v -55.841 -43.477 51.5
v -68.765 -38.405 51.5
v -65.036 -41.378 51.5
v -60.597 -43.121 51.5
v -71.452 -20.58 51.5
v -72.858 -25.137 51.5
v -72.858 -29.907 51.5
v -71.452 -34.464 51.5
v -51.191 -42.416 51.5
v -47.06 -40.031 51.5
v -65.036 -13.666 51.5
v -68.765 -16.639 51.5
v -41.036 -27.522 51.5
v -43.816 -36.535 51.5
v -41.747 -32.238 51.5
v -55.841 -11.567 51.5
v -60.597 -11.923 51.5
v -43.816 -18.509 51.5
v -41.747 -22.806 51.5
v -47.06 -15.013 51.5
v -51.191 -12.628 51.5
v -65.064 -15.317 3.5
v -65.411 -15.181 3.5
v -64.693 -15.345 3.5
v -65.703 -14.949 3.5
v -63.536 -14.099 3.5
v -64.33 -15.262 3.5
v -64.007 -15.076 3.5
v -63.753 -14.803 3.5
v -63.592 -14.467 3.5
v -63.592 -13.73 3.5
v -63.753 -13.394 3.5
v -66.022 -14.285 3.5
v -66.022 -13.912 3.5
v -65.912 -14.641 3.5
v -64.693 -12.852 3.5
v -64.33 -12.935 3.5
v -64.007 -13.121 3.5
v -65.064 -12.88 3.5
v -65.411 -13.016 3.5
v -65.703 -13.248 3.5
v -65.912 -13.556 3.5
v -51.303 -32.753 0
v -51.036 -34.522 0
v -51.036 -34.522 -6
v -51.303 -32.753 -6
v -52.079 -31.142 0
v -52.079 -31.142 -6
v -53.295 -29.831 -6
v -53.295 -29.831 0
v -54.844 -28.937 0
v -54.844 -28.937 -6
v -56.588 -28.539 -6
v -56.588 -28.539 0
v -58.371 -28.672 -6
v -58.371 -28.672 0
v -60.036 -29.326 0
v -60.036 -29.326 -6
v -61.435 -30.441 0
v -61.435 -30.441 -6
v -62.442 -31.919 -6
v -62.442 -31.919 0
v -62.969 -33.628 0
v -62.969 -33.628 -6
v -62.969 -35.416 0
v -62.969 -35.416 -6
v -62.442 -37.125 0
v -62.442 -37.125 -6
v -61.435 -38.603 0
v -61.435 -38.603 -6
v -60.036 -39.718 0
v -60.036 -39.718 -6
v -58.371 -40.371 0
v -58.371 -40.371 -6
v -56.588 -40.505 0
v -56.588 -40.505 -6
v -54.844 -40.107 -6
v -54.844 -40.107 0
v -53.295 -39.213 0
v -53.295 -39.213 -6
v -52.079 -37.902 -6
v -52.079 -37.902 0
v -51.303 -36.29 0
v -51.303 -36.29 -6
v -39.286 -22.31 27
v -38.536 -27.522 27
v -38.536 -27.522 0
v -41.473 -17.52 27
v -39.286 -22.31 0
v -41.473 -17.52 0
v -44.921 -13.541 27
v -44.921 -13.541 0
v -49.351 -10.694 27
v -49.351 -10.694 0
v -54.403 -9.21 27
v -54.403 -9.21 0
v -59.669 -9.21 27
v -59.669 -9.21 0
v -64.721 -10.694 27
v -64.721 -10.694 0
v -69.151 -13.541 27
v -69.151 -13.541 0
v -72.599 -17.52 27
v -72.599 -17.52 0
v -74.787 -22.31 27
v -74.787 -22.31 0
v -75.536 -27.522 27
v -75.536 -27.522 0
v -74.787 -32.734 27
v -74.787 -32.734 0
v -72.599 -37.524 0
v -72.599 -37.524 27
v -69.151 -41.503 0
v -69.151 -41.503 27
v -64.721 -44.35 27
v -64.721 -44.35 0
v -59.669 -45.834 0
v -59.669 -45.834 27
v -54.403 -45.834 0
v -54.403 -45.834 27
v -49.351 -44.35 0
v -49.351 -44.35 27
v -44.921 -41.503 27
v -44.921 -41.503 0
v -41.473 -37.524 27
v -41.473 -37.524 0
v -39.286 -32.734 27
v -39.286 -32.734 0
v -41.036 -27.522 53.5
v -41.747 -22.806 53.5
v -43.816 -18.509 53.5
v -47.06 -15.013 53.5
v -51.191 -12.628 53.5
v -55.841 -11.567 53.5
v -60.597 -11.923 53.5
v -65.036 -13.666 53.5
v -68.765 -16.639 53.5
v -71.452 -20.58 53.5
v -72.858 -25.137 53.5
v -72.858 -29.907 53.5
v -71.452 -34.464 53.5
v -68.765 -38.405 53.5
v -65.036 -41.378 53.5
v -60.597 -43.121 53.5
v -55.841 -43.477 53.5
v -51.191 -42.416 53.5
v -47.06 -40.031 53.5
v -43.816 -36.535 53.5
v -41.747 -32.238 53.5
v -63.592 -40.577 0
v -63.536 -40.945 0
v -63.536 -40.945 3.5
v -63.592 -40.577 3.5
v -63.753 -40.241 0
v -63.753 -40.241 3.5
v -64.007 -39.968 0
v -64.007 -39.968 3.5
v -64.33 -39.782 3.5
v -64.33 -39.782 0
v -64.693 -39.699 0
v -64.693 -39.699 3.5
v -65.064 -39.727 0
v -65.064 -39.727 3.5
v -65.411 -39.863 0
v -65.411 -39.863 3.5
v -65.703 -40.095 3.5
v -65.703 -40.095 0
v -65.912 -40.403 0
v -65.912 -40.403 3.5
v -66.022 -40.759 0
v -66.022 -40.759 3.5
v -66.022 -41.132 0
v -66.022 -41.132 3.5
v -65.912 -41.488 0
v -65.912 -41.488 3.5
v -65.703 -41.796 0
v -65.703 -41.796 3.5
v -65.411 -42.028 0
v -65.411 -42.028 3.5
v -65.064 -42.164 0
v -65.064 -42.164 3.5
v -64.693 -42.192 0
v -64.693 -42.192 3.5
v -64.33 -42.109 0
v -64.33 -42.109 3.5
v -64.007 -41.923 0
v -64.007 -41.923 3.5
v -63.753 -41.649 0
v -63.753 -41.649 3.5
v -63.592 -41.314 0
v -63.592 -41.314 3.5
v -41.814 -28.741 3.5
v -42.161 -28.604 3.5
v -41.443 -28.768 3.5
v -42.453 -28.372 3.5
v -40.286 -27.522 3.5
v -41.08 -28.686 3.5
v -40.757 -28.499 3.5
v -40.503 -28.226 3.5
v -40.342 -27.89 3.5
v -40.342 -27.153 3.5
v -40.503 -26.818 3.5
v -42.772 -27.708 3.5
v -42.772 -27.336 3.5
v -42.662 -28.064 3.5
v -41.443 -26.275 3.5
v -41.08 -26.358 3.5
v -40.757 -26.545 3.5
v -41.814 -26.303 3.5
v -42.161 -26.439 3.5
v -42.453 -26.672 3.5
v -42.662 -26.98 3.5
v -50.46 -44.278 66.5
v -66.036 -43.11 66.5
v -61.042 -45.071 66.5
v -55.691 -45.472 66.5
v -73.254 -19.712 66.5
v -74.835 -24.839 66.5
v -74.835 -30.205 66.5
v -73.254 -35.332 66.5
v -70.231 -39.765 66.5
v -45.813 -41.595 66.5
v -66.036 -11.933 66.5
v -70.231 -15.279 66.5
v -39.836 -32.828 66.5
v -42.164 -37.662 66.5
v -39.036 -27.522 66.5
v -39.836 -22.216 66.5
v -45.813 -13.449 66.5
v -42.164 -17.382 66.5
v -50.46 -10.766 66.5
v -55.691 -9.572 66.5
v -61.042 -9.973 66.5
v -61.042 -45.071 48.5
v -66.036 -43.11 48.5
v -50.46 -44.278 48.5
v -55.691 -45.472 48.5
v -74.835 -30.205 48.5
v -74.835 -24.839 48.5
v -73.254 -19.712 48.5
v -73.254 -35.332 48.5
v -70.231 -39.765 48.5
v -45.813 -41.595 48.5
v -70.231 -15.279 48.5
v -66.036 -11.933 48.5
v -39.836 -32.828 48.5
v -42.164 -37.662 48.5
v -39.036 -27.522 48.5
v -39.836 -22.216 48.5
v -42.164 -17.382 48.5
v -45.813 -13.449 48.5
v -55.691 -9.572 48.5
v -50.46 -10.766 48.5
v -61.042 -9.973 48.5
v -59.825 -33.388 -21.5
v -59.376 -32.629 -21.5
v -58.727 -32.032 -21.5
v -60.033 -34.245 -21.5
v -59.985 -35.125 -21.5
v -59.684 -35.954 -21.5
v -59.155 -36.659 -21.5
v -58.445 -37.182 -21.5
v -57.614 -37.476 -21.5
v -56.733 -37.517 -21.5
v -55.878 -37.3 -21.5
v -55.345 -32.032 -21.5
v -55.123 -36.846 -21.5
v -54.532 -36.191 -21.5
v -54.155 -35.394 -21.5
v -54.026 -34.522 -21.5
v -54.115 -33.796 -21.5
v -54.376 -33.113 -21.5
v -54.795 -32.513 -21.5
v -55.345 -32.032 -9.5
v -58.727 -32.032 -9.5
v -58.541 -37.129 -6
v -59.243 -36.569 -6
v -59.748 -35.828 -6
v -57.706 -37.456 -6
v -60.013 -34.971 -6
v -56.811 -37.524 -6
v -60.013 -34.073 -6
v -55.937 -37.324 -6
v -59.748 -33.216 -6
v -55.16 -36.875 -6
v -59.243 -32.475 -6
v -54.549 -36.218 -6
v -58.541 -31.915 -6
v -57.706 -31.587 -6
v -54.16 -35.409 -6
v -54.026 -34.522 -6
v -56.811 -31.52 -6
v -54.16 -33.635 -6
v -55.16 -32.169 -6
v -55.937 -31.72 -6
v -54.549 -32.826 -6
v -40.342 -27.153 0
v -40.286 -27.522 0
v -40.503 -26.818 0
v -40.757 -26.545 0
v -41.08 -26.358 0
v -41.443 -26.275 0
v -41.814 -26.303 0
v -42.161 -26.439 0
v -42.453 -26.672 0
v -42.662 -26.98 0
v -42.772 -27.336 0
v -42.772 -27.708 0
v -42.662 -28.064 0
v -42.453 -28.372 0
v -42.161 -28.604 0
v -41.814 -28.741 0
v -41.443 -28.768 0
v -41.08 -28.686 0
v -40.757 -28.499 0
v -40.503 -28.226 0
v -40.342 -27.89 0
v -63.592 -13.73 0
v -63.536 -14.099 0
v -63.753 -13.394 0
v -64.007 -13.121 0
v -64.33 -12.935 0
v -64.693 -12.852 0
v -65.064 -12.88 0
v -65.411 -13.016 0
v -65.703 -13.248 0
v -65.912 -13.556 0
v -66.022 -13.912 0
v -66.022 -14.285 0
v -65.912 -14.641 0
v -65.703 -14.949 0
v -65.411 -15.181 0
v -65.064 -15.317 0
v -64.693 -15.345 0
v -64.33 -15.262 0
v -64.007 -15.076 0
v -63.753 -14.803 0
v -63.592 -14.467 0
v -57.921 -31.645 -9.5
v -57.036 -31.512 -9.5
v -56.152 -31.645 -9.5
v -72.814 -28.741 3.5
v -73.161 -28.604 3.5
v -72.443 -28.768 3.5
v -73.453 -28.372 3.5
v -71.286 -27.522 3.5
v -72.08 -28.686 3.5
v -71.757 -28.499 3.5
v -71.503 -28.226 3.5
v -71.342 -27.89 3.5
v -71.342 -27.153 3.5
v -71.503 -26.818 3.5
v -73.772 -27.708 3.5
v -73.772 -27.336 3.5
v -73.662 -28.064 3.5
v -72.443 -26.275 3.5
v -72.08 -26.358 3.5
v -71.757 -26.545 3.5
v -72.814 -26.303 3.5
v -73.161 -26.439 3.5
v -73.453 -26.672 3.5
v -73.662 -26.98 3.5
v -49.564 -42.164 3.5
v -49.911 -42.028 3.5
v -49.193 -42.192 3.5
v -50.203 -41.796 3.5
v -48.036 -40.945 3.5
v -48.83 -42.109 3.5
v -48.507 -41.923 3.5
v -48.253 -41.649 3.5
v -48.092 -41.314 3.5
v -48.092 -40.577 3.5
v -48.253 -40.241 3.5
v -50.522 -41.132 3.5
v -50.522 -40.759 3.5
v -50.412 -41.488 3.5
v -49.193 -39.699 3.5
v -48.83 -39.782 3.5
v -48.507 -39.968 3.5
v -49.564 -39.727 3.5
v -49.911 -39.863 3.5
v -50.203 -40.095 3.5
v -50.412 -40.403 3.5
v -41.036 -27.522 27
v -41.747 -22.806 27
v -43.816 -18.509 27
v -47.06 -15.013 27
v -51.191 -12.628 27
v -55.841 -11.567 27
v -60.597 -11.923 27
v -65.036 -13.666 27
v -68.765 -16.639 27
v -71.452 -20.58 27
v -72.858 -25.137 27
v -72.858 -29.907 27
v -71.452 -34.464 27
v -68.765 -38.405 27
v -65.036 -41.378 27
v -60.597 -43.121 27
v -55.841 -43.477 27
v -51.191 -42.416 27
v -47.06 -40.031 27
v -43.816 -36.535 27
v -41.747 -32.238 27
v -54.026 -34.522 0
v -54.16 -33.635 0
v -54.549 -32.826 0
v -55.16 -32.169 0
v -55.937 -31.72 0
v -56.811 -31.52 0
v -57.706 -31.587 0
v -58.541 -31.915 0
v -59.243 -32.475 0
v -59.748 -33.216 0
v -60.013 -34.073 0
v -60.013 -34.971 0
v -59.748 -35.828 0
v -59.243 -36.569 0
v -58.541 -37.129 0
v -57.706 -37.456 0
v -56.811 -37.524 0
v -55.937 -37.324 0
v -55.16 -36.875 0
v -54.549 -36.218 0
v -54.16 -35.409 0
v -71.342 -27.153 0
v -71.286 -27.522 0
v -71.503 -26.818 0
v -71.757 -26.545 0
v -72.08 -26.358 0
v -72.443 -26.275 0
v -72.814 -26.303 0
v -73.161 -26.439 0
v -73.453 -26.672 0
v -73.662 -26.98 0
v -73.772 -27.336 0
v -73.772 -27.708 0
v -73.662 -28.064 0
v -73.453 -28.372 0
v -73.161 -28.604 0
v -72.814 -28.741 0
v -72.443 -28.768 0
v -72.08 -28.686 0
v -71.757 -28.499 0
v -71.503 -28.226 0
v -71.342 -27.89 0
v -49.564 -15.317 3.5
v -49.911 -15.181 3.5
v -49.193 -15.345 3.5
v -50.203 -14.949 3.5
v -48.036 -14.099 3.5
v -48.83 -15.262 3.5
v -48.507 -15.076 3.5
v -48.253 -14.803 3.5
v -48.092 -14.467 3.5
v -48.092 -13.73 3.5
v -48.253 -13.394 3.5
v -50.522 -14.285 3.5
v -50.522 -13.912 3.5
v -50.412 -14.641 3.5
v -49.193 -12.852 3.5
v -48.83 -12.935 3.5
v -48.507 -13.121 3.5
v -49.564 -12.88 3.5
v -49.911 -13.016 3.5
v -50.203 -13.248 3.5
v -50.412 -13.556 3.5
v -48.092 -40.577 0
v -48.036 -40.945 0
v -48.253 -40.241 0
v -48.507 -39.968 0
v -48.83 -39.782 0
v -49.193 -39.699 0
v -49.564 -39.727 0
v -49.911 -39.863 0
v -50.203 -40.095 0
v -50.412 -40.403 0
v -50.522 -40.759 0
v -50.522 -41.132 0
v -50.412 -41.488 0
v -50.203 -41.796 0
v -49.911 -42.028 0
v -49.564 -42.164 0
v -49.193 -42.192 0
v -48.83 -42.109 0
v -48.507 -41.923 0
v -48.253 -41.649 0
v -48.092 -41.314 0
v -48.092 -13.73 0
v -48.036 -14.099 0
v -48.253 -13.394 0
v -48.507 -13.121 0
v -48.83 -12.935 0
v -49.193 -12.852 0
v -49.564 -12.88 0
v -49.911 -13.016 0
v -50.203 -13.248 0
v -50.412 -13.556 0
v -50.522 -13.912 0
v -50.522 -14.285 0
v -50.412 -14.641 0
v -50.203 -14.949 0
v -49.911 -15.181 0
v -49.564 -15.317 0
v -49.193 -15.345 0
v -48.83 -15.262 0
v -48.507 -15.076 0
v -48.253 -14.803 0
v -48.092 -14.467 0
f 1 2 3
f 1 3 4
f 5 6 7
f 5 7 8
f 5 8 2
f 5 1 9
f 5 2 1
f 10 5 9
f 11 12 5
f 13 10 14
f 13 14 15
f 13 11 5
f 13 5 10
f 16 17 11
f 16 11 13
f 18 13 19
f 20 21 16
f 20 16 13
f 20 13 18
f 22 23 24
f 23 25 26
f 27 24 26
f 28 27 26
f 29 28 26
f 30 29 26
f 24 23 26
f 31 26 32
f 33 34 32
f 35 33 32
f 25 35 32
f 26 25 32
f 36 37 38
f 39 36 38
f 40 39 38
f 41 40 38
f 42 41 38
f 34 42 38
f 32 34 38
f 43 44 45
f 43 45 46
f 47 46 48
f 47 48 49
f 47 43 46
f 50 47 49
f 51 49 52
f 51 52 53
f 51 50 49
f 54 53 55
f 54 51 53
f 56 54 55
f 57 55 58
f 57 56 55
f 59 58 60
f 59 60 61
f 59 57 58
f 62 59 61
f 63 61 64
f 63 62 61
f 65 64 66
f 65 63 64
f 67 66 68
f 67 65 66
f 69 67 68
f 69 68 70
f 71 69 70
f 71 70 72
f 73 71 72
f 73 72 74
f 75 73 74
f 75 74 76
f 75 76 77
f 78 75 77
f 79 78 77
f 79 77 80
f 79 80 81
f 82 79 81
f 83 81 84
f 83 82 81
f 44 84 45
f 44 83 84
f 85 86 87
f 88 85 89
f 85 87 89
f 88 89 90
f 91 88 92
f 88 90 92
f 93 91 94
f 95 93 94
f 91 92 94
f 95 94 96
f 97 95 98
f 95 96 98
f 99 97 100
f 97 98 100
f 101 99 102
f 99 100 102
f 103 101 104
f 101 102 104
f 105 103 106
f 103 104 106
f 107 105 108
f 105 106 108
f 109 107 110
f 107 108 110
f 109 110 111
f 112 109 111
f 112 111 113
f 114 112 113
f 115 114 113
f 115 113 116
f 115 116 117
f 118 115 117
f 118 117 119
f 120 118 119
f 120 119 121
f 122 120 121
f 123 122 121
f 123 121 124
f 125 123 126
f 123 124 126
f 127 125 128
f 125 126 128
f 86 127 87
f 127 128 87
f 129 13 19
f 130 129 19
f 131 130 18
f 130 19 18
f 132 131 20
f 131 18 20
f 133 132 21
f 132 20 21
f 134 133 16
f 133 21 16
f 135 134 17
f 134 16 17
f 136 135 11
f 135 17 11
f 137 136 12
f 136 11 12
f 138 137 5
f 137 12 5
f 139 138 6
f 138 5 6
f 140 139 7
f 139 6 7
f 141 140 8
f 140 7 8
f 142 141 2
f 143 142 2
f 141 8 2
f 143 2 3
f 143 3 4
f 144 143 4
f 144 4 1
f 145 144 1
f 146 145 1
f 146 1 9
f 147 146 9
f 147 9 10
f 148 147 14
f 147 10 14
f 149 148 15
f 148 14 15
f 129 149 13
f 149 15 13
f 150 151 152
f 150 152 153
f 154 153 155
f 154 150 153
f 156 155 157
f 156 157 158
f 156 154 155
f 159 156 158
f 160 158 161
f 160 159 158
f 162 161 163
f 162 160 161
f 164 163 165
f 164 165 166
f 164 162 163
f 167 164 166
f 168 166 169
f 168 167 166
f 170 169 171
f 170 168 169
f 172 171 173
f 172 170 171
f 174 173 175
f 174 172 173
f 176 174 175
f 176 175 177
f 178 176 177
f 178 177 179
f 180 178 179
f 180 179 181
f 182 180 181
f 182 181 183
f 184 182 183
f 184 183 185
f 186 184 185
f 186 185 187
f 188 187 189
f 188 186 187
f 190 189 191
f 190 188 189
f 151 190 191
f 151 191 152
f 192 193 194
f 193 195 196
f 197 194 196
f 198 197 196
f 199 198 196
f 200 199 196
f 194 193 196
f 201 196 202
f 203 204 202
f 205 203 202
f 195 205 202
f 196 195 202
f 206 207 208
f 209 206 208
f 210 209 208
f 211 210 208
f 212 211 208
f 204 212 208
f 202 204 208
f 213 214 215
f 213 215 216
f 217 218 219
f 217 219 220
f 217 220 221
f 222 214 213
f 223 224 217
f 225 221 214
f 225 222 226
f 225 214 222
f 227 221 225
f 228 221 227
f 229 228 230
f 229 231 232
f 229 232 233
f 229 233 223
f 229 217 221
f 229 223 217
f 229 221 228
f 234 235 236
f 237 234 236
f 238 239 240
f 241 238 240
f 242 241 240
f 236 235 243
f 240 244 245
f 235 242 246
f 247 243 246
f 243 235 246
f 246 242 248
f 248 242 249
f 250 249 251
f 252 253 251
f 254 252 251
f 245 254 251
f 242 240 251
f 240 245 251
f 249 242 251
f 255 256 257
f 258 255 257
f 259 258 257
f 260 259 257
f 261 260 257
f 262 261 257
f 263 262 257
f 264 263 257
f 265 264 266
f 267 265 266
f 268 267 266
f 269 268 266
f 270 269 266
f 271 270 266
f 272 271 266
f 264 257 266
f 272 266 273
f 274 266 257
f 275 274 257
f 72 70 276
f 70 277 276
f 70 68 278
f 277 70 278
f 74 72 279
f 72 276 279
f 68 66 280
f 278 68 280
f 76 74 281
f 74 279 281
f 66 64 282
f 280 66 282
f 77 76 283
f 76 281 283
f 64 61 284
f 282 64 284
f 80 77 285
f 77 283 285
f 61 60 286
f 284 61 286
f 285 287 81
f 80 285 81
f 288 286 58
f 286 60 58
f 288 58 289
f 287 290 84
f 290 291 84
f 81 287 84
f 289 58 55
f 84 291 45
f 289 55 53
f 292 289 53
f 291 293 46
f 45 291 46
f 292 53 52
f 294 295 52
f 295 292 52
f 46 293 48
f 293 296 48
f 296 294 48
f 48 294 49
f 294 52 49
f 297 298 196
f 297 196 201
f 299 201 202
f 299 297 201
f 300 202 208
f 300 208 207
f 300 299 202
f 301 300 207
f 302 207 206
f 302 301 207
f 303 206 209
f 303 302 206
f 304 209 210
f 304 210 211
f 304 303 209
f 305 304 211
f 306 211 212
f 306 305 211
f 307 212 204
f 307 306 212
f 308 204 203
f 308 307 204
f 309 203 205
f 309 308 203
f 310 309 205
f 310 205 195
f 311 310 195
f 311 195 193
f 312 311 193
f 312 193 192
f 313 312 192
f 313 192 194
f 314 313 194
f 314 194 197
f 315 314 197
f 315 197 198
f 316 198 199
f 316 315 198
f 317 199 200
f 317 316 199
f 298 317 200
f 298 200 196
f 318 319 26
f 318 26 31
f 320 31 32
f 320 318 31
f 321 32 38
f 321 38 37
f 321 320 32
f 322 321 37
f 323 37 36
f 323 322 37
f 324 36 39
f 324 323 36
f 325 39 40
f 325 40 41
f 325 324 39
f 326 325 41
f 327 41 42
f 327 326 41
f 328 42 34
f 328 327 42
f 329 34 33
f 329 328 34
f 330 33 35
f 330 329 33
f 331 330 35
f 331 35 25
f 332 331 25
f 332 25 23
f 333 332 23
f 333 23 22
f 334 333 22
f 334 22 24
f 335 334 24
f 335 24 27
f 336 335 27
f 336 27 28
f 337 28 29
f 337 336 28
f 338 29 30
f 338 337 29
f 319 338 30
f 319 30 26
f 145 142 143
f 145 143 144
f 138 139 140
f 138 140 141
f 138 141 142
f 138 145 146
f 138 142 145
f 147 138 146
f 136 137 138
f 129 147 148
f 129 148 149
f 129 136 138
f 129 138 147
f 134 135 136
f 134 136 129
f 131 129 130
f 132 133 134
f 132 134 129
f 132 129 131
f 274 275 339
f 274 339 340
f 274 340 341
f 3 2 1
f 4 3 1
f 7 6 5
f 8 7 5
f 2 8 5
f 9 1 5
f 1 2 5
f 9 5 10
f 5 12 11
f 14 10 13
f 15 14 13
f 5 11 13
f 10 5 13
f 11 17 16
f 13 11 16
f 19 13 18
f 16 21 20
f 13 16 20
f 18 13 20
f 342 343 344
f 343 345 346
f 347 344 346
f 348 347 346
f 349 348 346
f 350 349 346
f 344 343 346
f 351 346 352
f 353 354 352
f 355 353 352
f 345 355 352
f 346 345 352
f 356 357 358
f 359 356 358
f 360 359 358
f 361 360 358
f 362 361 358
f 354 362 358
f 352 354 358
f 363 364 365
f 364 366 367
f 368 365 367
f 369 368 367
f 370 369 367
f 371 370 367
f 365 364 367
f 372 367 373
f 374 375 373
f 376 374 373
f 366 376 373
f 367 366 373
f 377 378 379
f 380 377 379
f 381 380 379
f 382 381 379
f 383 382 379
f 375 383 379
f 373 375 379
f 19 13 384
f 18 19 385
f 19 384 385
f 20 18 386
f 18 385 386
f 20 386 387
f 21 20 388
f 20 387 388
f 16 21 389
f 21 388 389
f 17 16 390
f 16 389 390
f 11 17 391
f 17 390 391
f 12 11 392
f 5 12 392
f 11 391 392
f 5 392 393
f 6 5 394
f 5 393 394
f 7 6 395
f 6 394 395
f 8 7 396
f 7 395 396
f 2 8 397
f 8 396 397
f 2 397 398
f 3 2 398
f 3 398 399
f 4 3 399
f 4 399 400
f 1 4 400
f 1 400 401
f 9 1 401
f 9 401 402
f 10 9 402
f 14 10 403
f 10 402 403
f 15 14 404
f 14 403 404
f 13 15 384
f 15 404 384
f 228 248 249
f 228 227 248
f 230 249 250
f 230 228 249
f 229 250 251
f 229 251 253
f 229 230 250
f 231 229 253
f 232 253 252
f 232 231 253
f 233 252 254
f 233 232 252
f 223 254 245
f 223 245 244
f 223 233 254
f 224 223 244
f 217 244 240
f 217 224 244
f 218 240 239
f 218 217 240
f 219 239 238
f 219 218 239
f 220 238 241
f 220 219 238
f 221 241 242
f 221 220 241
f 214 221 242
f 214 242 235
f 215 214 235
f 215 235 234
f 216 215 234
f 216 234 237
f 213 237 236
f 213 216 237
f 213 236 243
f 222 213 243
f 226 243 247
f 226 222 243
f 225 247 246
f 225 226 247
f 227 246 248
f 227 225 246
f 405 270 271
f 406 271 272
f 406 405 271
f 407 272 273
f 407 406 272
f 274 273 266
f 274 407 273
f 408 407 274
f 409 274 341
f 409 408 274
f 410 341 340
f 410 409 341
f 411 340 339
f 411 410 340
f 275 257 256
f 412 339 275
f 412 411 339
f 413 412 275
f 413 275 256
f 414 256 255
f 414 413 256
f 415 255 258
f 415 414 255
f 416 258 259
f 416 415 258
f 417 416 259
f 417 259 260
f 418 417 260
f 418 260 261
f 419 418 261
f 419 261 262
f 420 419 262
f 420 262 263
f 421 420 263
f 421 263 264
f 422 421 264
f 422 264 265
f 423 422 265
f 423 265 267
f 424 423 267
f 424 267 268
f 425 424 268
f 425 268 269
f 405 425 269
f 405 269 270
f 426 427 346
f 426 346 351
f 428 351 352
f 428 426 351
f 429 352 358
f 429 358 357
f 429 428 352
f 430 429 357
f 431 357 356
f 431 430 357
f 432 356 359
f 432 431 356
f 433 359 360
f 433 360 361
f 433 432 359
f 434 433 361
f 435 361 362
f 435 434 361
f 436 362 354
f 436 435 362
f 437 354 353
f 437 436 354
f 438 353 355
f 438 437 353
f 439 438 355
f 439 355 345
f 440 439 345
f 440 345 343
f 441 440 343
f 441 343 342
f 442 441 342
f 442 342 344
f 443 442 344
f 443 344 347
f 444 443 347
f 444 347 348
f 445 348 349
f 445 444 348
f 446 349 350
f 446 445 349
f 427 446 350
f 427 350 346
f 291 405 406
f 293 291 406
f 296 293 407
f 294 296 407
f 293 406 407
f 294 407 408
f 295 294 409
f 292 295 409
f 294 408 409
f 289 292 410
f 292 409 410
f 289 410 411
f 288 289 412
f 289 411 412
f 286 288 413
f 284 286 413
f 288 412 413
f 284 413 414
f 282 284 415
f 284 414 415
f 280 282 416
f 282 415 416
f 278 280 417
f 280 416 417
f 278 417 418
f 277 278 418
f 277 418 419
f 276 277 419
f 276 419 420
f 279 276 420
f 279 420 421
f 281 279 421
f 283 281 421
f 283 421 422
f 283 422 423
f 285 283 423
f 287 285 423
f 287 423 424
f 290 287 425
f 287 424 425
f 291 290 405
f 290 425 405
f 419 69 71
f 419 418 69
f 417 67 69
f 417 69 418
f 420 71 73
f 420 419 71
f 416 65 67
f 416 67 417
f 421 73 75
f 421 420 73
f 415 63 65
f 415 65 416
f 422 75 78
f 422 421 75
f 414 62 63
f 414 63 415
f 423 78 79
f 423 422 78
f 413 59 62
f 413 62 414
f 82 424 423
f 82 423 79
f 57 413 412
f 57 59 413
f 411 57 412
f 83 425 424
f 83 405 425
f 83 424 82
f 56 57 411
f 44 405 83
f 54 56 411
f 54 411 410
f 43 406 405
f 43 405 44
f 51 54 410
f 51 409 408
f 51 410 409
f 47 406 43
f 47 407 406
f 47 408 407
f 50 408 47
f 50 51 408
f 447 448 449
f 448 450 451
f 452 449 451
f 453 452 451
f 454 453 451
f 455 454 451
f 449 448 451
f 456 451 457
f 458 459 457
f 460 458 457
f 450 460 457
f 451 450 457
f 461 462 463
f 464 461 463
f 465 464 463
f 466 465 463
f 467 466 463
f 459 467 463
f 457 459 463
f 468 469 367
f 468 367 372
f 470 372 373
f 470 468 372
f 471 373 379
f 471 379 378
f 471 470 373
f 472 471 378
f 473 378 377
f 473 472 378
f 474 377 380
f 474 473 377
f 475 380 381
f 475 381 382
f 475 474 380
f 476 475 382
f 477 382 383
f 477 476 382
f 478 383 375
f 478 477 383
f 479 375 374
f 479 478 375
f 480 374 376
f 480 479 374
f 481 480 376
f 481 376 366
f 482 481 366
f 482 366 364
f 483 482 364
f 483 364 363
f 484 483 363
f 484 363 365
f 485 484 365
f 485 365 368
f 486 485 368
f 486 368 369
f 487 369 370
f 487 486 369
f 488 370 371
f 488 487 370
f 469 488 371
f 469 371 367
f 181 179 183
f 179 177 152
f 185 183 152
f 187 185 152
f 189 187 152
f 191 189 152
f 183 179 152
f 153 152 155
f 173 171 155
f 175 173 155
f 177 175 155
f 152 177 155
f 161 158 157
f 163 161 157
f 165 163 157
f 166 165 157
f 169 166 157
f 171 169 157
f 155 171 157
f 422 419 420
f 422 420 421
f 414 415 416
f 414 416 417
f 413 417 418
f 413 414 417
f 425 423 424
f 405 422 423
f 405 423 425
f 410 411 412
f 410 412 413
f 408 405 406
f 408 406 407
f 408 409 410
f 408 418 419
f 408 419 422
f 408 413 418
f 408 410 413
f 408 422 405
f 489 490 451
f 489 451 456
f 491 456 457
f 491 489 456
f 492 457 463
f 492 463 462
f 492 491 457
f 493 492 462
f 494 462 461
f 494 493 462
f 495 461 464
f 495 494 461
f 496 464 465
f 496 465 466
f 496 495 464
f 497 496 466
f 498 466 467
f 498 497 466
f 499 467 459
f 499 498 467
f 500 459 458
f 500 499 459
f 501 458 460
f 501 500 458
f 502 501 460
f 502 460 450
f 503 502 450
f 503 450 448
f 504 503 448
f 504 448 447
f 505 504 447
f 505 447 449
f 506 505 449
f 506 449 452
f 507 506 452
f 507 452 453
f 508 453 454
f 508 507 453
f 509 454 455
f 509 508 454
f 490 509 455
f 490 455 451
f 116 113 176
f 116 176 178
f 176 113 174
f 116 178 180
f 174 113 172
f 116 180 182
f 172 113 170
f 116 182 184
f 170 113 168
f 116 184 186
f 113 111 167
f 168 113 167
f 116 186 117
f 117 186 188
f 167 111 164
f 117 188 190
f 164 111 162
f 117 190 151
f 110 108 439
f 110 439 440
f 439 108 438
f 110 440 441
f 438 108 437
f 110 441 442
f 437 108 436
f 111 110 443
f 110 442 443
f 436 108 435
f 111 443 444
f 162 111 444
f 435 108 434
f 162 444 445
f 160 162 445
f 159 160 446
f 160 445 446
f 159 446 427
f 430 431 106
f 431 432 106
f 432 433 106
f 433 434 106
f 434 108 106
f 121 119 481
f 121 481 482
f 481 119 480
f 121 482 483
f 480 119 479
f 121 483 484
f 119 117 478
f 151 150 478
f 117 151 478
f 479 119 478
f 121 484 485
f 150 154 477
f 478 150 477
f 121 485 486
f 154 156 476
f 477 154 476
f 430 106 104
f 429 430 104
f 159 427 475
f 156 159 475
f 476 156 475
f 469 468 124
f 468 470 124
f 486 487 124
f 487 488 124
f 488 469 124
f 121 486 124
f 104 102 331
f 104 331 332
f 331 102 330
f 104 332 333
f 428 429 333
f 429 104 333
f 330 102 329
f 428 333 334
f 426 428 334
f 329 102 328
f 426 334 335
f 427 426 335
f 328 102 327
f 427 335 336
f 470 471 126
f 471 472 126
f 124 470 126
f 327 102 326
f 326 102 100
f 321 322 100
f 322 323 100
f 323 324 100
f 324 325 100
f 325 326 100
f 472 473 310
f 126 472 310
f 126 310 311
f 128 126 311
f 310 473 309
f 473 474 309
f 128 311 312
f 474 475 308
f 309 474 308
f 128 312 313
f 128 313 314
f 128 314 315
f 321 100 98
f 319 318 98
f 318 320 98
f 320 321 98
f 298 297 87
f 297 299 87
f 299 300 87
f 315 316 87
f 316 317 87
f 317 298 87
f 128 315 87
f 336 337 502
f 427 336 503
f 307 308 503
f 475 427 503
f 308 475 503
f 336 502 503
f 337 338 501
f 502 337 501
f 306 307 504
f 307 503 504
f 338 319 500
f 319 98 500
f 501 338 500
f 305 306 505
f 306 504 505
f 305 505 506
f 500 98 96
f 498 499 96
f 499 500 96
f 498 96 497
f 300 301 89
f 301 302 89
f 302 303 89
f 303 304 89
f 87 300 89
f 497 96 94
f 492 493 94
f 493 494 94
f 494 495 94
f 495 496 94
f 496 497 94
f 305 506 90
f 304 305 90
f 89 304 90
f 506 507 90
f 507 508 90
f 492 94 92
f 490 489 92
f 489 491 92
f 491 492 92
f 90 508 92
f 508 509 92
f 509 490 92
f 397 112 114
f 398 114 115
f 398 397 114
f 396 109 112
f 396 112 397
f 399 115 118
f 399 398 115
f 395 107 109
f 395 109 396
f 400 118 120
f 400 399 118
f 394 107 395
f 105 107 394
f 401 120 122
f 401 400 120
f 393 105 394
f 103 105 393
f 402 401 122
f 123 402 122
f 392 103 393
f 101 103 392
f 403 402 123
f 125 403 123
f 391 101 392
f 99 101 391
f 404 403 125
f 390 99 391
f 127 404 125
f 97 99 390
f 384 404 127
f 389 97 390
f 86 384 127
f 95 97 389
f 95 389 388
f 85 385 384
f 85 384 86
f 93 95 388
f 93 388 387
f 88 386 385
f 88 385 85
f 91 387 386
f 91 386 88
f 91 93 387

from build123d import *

# Parameters (mm, degrees)
F0_R           = 3.01
F1_DEPTH       = 21.5
F0_R_2         = 6
F2_DEPTH       = 6
F0_R_3         = 18.5
F0_R_4         = 1.25
F3_DEPTH       = 27
F4_DEPTH       = 3.5
F7_DEPTH       = 12
F8_R           = 16
F9_DEPTH       = 24.5
F10_R          = 16
F11_DEPTH      = 2
F12_R          = 18
F13_DEPTH      = 13
F13_DEPTH_BACK = 5


with BuildPart() as f1:
    # F0 (on Top) → F1 (new body)
    with BuildSketch(Plane.XY):
        with Locations((-57.0362173021, -34.5219187438)):
            Circle(F0_R)
    extrude(amount=-F1_DEPTH)

    # F6 (on face) → F7 (cut)
    with BuildSketch(Plane(origin=(0, 0, -21.5), x_dir=(1, 0, 0), z_dir=(0, 0, -1))):
        with BuildLine():
            Line((-55.3450638496, 32.0319187438), (-58.7273707546, 32.0319187438))
            ThreePointArc((-58.7273707546, 32.0319187438), (-57.0362173021, 31.5119187438), (-55.3450638496, 32.0319187438))
        make_face()
    extrude(amount=-F7_DEPTH, mode=Mode.SUBTRACT)


with BuildPart() as f2:
    # F0 (on Top) → F2 (new body)
    with BuildSketch(Plane.XY):
        with Locations((-57.0362173021, -34.5219187438)):
            Circle(F0_R_2)
        with Locations((-57.0362173021, -34.5219187438)):
            Circle(F0_R, mode=Mode.SUBTRACT)
    extrude(amount=-F2_DEPTH)


with BuildPart() as f3:
    # F0 (on Top) → F3 (new body)
    with BuildSketch(Plane.XY):
        with Locations((-57.0362173021, -27.5219187438)):
            Circle(F0_R_3)
        with Locations((-64.7862173021, -40.9453125025)):
            Circle(F0_R_4, mode=Mode.SUBTRACT)
        with Locations((-49.2862173021, -40.9453125025)):
            Circle(F0_R_4, mode=Mode.SUBTRACT)
        with Locations((-57.0362173021, -34.5219187438)):
            Circle(F0_R_2, mode=Mode.SUBTRACT)
        with Locations((-72.5362173021, -27.5219187438)):
            Circle(F0_R_4, mode=Mode.SUBTRACT)
        with Locations((-64.7862173021, -14.0985249852)):
            Circle(F0_R_4, mode=Mode.SUBTRACT)
        with Locations((-41.5362173021, -27.5219187438)):
            Circle(F0_R_4, mode=Mode.SUBTRACT)
        with Locations((-49.2862173021, -14.0985249852)):
            Circle(F0_R_4, mode=Mode.SUBTRACT)
        with Locations((-57.0362173021, -34.5219187438)):
            Circle(F0_R_2)
        with Locations((-57.0362173021, -34.5219187438)):
            Circle(F0_R, mode=Mode.SUBTRACT)
        with Locations((-57.0362173021, -34.5219187438)):
            Circle(F0_R)
        with Locations((-64.7862173021, -40.9453125025)):
            Circle(F0_R_4)
        with Locations((-49.2862173021, -40.9453125025)):
            Circle(F0_R_4)
        with Locations((-41.5362173021, -27.5219187438)):
            Circle(F0_R_4)
        with Locations((-49.2862173021, -14.0985249852)):
            Circle(F0_R_4)
        with Locations((-64.7862173021, -14.0985249852)):
            Circle(F0_R_4)
        with Locations((-72.5362173021, -27.5219187438)):
            Circle(F0_R_4)
    extrude(amount=F3_DEPTH)


with BuildPart() as f4:
    # F0 (on Top) → F4 (new body)
    with BuildSketch(Plane.XY):
        with Locations((-64.7862173021, -40.9453125025)):
            Circle(F0_R_4)
    extrude(amount=F4_DEPTH)


with BuildPart() as f4b:
    # F0 (on Top) → F4, piece 2 (new body)
    with BuildSketch(Plane.XY):
        with Locations((-49.2862173021, -40.9453125025)):
            Circle(F0_R_4)
    extrude(amount=F4_DEPTH)


with BuildPart() as f4c:
    # F0 (on Top) → F4, piece 3 (new body)
    with BuildSketch(Plane.XY):
        with Locations((-41.5362173021, -27.5219187438)):
            Circle(F0_R_4)
    extrude(amount=F4_DEPTH)


with BuildPart() as f4d:
    # F0 (on Top) → F4, piece 4 (new body)
    with BuildSketch(Plane.XY):
        with Locations((-49.2862173021, -14.0985249852)):
            Circle(F0_R_4)
    extrude(amount=F4_DEPTH)


with BuildPart() as f4e:
    # F0 (on Top) → F4, piece 5 (new body)
    with BuildSketch(Plane.XY):
        with Locations((-64.7862173021, -14.0985249852)):
            Circle(F0_R_4)
    extrude(amount=F4_DEPTH)


with BuildPart() as f4f:
    # F0 (on Top) → F4, piece 6 (new body)
    with BuildSketch(Plane.XY):
        with Locations((-72.5362173021, -27.5219187438)):
            Circle(F0_R_4)
    extrude(amount=F4_DEPTH)


with BuildPart() as f3_1:
    add(f3.part)

    # F5: cut F4b, F4f, F4, F4e, F4d, F4c
    add(f4b.part, mode=Mode.SUBTRACT)
    add(f4f.part, mode=Mode.SUBTRACT)
    add(f4.part, mode=Mode.SUBTRACT)
    add(f4e.part, mode=Mode.SUBTRACT)
    add(f4d.part, mode=Mode.SUBTRACT)
    add(f4c.part, mode=Mode.SUBTRACT)

    # F8 (on face) → F9 (join)
    with BuildSketch(Plane.XY.offset(27)):
        with Locations((-57.0362173021, -27.5219187438)):
            Circle(F8_R)
    extrude(amount=F9_DEPTH)


with BuildPart() as f11:
    # F10 (on face) → F11 (new body)
    with BuildSketch(Plane.XY.offset(51.5)):
        with Locations((-57.0362173021, -27.5219187438)):
            Circle(F10_R)
    extrude(amount=F11_DEPTH)


with BuildPart() as f13:
    # F12 (on face) → F13 (new body, two sides)
    with BuildSketch(Plane.XY.offset(53.5)) as f13_sk:
        with Locations((-57.0362173021, -27.5219187438)):
            Circle(F12_R)
    extrude(amount=F13_DEPTH)
    extrude(f13_sk.sketch, amount=-F13_DEPTH_BACK)


solid = Compound([f1.part, f2.part, f3_1.part, f11.part, f13.part])
